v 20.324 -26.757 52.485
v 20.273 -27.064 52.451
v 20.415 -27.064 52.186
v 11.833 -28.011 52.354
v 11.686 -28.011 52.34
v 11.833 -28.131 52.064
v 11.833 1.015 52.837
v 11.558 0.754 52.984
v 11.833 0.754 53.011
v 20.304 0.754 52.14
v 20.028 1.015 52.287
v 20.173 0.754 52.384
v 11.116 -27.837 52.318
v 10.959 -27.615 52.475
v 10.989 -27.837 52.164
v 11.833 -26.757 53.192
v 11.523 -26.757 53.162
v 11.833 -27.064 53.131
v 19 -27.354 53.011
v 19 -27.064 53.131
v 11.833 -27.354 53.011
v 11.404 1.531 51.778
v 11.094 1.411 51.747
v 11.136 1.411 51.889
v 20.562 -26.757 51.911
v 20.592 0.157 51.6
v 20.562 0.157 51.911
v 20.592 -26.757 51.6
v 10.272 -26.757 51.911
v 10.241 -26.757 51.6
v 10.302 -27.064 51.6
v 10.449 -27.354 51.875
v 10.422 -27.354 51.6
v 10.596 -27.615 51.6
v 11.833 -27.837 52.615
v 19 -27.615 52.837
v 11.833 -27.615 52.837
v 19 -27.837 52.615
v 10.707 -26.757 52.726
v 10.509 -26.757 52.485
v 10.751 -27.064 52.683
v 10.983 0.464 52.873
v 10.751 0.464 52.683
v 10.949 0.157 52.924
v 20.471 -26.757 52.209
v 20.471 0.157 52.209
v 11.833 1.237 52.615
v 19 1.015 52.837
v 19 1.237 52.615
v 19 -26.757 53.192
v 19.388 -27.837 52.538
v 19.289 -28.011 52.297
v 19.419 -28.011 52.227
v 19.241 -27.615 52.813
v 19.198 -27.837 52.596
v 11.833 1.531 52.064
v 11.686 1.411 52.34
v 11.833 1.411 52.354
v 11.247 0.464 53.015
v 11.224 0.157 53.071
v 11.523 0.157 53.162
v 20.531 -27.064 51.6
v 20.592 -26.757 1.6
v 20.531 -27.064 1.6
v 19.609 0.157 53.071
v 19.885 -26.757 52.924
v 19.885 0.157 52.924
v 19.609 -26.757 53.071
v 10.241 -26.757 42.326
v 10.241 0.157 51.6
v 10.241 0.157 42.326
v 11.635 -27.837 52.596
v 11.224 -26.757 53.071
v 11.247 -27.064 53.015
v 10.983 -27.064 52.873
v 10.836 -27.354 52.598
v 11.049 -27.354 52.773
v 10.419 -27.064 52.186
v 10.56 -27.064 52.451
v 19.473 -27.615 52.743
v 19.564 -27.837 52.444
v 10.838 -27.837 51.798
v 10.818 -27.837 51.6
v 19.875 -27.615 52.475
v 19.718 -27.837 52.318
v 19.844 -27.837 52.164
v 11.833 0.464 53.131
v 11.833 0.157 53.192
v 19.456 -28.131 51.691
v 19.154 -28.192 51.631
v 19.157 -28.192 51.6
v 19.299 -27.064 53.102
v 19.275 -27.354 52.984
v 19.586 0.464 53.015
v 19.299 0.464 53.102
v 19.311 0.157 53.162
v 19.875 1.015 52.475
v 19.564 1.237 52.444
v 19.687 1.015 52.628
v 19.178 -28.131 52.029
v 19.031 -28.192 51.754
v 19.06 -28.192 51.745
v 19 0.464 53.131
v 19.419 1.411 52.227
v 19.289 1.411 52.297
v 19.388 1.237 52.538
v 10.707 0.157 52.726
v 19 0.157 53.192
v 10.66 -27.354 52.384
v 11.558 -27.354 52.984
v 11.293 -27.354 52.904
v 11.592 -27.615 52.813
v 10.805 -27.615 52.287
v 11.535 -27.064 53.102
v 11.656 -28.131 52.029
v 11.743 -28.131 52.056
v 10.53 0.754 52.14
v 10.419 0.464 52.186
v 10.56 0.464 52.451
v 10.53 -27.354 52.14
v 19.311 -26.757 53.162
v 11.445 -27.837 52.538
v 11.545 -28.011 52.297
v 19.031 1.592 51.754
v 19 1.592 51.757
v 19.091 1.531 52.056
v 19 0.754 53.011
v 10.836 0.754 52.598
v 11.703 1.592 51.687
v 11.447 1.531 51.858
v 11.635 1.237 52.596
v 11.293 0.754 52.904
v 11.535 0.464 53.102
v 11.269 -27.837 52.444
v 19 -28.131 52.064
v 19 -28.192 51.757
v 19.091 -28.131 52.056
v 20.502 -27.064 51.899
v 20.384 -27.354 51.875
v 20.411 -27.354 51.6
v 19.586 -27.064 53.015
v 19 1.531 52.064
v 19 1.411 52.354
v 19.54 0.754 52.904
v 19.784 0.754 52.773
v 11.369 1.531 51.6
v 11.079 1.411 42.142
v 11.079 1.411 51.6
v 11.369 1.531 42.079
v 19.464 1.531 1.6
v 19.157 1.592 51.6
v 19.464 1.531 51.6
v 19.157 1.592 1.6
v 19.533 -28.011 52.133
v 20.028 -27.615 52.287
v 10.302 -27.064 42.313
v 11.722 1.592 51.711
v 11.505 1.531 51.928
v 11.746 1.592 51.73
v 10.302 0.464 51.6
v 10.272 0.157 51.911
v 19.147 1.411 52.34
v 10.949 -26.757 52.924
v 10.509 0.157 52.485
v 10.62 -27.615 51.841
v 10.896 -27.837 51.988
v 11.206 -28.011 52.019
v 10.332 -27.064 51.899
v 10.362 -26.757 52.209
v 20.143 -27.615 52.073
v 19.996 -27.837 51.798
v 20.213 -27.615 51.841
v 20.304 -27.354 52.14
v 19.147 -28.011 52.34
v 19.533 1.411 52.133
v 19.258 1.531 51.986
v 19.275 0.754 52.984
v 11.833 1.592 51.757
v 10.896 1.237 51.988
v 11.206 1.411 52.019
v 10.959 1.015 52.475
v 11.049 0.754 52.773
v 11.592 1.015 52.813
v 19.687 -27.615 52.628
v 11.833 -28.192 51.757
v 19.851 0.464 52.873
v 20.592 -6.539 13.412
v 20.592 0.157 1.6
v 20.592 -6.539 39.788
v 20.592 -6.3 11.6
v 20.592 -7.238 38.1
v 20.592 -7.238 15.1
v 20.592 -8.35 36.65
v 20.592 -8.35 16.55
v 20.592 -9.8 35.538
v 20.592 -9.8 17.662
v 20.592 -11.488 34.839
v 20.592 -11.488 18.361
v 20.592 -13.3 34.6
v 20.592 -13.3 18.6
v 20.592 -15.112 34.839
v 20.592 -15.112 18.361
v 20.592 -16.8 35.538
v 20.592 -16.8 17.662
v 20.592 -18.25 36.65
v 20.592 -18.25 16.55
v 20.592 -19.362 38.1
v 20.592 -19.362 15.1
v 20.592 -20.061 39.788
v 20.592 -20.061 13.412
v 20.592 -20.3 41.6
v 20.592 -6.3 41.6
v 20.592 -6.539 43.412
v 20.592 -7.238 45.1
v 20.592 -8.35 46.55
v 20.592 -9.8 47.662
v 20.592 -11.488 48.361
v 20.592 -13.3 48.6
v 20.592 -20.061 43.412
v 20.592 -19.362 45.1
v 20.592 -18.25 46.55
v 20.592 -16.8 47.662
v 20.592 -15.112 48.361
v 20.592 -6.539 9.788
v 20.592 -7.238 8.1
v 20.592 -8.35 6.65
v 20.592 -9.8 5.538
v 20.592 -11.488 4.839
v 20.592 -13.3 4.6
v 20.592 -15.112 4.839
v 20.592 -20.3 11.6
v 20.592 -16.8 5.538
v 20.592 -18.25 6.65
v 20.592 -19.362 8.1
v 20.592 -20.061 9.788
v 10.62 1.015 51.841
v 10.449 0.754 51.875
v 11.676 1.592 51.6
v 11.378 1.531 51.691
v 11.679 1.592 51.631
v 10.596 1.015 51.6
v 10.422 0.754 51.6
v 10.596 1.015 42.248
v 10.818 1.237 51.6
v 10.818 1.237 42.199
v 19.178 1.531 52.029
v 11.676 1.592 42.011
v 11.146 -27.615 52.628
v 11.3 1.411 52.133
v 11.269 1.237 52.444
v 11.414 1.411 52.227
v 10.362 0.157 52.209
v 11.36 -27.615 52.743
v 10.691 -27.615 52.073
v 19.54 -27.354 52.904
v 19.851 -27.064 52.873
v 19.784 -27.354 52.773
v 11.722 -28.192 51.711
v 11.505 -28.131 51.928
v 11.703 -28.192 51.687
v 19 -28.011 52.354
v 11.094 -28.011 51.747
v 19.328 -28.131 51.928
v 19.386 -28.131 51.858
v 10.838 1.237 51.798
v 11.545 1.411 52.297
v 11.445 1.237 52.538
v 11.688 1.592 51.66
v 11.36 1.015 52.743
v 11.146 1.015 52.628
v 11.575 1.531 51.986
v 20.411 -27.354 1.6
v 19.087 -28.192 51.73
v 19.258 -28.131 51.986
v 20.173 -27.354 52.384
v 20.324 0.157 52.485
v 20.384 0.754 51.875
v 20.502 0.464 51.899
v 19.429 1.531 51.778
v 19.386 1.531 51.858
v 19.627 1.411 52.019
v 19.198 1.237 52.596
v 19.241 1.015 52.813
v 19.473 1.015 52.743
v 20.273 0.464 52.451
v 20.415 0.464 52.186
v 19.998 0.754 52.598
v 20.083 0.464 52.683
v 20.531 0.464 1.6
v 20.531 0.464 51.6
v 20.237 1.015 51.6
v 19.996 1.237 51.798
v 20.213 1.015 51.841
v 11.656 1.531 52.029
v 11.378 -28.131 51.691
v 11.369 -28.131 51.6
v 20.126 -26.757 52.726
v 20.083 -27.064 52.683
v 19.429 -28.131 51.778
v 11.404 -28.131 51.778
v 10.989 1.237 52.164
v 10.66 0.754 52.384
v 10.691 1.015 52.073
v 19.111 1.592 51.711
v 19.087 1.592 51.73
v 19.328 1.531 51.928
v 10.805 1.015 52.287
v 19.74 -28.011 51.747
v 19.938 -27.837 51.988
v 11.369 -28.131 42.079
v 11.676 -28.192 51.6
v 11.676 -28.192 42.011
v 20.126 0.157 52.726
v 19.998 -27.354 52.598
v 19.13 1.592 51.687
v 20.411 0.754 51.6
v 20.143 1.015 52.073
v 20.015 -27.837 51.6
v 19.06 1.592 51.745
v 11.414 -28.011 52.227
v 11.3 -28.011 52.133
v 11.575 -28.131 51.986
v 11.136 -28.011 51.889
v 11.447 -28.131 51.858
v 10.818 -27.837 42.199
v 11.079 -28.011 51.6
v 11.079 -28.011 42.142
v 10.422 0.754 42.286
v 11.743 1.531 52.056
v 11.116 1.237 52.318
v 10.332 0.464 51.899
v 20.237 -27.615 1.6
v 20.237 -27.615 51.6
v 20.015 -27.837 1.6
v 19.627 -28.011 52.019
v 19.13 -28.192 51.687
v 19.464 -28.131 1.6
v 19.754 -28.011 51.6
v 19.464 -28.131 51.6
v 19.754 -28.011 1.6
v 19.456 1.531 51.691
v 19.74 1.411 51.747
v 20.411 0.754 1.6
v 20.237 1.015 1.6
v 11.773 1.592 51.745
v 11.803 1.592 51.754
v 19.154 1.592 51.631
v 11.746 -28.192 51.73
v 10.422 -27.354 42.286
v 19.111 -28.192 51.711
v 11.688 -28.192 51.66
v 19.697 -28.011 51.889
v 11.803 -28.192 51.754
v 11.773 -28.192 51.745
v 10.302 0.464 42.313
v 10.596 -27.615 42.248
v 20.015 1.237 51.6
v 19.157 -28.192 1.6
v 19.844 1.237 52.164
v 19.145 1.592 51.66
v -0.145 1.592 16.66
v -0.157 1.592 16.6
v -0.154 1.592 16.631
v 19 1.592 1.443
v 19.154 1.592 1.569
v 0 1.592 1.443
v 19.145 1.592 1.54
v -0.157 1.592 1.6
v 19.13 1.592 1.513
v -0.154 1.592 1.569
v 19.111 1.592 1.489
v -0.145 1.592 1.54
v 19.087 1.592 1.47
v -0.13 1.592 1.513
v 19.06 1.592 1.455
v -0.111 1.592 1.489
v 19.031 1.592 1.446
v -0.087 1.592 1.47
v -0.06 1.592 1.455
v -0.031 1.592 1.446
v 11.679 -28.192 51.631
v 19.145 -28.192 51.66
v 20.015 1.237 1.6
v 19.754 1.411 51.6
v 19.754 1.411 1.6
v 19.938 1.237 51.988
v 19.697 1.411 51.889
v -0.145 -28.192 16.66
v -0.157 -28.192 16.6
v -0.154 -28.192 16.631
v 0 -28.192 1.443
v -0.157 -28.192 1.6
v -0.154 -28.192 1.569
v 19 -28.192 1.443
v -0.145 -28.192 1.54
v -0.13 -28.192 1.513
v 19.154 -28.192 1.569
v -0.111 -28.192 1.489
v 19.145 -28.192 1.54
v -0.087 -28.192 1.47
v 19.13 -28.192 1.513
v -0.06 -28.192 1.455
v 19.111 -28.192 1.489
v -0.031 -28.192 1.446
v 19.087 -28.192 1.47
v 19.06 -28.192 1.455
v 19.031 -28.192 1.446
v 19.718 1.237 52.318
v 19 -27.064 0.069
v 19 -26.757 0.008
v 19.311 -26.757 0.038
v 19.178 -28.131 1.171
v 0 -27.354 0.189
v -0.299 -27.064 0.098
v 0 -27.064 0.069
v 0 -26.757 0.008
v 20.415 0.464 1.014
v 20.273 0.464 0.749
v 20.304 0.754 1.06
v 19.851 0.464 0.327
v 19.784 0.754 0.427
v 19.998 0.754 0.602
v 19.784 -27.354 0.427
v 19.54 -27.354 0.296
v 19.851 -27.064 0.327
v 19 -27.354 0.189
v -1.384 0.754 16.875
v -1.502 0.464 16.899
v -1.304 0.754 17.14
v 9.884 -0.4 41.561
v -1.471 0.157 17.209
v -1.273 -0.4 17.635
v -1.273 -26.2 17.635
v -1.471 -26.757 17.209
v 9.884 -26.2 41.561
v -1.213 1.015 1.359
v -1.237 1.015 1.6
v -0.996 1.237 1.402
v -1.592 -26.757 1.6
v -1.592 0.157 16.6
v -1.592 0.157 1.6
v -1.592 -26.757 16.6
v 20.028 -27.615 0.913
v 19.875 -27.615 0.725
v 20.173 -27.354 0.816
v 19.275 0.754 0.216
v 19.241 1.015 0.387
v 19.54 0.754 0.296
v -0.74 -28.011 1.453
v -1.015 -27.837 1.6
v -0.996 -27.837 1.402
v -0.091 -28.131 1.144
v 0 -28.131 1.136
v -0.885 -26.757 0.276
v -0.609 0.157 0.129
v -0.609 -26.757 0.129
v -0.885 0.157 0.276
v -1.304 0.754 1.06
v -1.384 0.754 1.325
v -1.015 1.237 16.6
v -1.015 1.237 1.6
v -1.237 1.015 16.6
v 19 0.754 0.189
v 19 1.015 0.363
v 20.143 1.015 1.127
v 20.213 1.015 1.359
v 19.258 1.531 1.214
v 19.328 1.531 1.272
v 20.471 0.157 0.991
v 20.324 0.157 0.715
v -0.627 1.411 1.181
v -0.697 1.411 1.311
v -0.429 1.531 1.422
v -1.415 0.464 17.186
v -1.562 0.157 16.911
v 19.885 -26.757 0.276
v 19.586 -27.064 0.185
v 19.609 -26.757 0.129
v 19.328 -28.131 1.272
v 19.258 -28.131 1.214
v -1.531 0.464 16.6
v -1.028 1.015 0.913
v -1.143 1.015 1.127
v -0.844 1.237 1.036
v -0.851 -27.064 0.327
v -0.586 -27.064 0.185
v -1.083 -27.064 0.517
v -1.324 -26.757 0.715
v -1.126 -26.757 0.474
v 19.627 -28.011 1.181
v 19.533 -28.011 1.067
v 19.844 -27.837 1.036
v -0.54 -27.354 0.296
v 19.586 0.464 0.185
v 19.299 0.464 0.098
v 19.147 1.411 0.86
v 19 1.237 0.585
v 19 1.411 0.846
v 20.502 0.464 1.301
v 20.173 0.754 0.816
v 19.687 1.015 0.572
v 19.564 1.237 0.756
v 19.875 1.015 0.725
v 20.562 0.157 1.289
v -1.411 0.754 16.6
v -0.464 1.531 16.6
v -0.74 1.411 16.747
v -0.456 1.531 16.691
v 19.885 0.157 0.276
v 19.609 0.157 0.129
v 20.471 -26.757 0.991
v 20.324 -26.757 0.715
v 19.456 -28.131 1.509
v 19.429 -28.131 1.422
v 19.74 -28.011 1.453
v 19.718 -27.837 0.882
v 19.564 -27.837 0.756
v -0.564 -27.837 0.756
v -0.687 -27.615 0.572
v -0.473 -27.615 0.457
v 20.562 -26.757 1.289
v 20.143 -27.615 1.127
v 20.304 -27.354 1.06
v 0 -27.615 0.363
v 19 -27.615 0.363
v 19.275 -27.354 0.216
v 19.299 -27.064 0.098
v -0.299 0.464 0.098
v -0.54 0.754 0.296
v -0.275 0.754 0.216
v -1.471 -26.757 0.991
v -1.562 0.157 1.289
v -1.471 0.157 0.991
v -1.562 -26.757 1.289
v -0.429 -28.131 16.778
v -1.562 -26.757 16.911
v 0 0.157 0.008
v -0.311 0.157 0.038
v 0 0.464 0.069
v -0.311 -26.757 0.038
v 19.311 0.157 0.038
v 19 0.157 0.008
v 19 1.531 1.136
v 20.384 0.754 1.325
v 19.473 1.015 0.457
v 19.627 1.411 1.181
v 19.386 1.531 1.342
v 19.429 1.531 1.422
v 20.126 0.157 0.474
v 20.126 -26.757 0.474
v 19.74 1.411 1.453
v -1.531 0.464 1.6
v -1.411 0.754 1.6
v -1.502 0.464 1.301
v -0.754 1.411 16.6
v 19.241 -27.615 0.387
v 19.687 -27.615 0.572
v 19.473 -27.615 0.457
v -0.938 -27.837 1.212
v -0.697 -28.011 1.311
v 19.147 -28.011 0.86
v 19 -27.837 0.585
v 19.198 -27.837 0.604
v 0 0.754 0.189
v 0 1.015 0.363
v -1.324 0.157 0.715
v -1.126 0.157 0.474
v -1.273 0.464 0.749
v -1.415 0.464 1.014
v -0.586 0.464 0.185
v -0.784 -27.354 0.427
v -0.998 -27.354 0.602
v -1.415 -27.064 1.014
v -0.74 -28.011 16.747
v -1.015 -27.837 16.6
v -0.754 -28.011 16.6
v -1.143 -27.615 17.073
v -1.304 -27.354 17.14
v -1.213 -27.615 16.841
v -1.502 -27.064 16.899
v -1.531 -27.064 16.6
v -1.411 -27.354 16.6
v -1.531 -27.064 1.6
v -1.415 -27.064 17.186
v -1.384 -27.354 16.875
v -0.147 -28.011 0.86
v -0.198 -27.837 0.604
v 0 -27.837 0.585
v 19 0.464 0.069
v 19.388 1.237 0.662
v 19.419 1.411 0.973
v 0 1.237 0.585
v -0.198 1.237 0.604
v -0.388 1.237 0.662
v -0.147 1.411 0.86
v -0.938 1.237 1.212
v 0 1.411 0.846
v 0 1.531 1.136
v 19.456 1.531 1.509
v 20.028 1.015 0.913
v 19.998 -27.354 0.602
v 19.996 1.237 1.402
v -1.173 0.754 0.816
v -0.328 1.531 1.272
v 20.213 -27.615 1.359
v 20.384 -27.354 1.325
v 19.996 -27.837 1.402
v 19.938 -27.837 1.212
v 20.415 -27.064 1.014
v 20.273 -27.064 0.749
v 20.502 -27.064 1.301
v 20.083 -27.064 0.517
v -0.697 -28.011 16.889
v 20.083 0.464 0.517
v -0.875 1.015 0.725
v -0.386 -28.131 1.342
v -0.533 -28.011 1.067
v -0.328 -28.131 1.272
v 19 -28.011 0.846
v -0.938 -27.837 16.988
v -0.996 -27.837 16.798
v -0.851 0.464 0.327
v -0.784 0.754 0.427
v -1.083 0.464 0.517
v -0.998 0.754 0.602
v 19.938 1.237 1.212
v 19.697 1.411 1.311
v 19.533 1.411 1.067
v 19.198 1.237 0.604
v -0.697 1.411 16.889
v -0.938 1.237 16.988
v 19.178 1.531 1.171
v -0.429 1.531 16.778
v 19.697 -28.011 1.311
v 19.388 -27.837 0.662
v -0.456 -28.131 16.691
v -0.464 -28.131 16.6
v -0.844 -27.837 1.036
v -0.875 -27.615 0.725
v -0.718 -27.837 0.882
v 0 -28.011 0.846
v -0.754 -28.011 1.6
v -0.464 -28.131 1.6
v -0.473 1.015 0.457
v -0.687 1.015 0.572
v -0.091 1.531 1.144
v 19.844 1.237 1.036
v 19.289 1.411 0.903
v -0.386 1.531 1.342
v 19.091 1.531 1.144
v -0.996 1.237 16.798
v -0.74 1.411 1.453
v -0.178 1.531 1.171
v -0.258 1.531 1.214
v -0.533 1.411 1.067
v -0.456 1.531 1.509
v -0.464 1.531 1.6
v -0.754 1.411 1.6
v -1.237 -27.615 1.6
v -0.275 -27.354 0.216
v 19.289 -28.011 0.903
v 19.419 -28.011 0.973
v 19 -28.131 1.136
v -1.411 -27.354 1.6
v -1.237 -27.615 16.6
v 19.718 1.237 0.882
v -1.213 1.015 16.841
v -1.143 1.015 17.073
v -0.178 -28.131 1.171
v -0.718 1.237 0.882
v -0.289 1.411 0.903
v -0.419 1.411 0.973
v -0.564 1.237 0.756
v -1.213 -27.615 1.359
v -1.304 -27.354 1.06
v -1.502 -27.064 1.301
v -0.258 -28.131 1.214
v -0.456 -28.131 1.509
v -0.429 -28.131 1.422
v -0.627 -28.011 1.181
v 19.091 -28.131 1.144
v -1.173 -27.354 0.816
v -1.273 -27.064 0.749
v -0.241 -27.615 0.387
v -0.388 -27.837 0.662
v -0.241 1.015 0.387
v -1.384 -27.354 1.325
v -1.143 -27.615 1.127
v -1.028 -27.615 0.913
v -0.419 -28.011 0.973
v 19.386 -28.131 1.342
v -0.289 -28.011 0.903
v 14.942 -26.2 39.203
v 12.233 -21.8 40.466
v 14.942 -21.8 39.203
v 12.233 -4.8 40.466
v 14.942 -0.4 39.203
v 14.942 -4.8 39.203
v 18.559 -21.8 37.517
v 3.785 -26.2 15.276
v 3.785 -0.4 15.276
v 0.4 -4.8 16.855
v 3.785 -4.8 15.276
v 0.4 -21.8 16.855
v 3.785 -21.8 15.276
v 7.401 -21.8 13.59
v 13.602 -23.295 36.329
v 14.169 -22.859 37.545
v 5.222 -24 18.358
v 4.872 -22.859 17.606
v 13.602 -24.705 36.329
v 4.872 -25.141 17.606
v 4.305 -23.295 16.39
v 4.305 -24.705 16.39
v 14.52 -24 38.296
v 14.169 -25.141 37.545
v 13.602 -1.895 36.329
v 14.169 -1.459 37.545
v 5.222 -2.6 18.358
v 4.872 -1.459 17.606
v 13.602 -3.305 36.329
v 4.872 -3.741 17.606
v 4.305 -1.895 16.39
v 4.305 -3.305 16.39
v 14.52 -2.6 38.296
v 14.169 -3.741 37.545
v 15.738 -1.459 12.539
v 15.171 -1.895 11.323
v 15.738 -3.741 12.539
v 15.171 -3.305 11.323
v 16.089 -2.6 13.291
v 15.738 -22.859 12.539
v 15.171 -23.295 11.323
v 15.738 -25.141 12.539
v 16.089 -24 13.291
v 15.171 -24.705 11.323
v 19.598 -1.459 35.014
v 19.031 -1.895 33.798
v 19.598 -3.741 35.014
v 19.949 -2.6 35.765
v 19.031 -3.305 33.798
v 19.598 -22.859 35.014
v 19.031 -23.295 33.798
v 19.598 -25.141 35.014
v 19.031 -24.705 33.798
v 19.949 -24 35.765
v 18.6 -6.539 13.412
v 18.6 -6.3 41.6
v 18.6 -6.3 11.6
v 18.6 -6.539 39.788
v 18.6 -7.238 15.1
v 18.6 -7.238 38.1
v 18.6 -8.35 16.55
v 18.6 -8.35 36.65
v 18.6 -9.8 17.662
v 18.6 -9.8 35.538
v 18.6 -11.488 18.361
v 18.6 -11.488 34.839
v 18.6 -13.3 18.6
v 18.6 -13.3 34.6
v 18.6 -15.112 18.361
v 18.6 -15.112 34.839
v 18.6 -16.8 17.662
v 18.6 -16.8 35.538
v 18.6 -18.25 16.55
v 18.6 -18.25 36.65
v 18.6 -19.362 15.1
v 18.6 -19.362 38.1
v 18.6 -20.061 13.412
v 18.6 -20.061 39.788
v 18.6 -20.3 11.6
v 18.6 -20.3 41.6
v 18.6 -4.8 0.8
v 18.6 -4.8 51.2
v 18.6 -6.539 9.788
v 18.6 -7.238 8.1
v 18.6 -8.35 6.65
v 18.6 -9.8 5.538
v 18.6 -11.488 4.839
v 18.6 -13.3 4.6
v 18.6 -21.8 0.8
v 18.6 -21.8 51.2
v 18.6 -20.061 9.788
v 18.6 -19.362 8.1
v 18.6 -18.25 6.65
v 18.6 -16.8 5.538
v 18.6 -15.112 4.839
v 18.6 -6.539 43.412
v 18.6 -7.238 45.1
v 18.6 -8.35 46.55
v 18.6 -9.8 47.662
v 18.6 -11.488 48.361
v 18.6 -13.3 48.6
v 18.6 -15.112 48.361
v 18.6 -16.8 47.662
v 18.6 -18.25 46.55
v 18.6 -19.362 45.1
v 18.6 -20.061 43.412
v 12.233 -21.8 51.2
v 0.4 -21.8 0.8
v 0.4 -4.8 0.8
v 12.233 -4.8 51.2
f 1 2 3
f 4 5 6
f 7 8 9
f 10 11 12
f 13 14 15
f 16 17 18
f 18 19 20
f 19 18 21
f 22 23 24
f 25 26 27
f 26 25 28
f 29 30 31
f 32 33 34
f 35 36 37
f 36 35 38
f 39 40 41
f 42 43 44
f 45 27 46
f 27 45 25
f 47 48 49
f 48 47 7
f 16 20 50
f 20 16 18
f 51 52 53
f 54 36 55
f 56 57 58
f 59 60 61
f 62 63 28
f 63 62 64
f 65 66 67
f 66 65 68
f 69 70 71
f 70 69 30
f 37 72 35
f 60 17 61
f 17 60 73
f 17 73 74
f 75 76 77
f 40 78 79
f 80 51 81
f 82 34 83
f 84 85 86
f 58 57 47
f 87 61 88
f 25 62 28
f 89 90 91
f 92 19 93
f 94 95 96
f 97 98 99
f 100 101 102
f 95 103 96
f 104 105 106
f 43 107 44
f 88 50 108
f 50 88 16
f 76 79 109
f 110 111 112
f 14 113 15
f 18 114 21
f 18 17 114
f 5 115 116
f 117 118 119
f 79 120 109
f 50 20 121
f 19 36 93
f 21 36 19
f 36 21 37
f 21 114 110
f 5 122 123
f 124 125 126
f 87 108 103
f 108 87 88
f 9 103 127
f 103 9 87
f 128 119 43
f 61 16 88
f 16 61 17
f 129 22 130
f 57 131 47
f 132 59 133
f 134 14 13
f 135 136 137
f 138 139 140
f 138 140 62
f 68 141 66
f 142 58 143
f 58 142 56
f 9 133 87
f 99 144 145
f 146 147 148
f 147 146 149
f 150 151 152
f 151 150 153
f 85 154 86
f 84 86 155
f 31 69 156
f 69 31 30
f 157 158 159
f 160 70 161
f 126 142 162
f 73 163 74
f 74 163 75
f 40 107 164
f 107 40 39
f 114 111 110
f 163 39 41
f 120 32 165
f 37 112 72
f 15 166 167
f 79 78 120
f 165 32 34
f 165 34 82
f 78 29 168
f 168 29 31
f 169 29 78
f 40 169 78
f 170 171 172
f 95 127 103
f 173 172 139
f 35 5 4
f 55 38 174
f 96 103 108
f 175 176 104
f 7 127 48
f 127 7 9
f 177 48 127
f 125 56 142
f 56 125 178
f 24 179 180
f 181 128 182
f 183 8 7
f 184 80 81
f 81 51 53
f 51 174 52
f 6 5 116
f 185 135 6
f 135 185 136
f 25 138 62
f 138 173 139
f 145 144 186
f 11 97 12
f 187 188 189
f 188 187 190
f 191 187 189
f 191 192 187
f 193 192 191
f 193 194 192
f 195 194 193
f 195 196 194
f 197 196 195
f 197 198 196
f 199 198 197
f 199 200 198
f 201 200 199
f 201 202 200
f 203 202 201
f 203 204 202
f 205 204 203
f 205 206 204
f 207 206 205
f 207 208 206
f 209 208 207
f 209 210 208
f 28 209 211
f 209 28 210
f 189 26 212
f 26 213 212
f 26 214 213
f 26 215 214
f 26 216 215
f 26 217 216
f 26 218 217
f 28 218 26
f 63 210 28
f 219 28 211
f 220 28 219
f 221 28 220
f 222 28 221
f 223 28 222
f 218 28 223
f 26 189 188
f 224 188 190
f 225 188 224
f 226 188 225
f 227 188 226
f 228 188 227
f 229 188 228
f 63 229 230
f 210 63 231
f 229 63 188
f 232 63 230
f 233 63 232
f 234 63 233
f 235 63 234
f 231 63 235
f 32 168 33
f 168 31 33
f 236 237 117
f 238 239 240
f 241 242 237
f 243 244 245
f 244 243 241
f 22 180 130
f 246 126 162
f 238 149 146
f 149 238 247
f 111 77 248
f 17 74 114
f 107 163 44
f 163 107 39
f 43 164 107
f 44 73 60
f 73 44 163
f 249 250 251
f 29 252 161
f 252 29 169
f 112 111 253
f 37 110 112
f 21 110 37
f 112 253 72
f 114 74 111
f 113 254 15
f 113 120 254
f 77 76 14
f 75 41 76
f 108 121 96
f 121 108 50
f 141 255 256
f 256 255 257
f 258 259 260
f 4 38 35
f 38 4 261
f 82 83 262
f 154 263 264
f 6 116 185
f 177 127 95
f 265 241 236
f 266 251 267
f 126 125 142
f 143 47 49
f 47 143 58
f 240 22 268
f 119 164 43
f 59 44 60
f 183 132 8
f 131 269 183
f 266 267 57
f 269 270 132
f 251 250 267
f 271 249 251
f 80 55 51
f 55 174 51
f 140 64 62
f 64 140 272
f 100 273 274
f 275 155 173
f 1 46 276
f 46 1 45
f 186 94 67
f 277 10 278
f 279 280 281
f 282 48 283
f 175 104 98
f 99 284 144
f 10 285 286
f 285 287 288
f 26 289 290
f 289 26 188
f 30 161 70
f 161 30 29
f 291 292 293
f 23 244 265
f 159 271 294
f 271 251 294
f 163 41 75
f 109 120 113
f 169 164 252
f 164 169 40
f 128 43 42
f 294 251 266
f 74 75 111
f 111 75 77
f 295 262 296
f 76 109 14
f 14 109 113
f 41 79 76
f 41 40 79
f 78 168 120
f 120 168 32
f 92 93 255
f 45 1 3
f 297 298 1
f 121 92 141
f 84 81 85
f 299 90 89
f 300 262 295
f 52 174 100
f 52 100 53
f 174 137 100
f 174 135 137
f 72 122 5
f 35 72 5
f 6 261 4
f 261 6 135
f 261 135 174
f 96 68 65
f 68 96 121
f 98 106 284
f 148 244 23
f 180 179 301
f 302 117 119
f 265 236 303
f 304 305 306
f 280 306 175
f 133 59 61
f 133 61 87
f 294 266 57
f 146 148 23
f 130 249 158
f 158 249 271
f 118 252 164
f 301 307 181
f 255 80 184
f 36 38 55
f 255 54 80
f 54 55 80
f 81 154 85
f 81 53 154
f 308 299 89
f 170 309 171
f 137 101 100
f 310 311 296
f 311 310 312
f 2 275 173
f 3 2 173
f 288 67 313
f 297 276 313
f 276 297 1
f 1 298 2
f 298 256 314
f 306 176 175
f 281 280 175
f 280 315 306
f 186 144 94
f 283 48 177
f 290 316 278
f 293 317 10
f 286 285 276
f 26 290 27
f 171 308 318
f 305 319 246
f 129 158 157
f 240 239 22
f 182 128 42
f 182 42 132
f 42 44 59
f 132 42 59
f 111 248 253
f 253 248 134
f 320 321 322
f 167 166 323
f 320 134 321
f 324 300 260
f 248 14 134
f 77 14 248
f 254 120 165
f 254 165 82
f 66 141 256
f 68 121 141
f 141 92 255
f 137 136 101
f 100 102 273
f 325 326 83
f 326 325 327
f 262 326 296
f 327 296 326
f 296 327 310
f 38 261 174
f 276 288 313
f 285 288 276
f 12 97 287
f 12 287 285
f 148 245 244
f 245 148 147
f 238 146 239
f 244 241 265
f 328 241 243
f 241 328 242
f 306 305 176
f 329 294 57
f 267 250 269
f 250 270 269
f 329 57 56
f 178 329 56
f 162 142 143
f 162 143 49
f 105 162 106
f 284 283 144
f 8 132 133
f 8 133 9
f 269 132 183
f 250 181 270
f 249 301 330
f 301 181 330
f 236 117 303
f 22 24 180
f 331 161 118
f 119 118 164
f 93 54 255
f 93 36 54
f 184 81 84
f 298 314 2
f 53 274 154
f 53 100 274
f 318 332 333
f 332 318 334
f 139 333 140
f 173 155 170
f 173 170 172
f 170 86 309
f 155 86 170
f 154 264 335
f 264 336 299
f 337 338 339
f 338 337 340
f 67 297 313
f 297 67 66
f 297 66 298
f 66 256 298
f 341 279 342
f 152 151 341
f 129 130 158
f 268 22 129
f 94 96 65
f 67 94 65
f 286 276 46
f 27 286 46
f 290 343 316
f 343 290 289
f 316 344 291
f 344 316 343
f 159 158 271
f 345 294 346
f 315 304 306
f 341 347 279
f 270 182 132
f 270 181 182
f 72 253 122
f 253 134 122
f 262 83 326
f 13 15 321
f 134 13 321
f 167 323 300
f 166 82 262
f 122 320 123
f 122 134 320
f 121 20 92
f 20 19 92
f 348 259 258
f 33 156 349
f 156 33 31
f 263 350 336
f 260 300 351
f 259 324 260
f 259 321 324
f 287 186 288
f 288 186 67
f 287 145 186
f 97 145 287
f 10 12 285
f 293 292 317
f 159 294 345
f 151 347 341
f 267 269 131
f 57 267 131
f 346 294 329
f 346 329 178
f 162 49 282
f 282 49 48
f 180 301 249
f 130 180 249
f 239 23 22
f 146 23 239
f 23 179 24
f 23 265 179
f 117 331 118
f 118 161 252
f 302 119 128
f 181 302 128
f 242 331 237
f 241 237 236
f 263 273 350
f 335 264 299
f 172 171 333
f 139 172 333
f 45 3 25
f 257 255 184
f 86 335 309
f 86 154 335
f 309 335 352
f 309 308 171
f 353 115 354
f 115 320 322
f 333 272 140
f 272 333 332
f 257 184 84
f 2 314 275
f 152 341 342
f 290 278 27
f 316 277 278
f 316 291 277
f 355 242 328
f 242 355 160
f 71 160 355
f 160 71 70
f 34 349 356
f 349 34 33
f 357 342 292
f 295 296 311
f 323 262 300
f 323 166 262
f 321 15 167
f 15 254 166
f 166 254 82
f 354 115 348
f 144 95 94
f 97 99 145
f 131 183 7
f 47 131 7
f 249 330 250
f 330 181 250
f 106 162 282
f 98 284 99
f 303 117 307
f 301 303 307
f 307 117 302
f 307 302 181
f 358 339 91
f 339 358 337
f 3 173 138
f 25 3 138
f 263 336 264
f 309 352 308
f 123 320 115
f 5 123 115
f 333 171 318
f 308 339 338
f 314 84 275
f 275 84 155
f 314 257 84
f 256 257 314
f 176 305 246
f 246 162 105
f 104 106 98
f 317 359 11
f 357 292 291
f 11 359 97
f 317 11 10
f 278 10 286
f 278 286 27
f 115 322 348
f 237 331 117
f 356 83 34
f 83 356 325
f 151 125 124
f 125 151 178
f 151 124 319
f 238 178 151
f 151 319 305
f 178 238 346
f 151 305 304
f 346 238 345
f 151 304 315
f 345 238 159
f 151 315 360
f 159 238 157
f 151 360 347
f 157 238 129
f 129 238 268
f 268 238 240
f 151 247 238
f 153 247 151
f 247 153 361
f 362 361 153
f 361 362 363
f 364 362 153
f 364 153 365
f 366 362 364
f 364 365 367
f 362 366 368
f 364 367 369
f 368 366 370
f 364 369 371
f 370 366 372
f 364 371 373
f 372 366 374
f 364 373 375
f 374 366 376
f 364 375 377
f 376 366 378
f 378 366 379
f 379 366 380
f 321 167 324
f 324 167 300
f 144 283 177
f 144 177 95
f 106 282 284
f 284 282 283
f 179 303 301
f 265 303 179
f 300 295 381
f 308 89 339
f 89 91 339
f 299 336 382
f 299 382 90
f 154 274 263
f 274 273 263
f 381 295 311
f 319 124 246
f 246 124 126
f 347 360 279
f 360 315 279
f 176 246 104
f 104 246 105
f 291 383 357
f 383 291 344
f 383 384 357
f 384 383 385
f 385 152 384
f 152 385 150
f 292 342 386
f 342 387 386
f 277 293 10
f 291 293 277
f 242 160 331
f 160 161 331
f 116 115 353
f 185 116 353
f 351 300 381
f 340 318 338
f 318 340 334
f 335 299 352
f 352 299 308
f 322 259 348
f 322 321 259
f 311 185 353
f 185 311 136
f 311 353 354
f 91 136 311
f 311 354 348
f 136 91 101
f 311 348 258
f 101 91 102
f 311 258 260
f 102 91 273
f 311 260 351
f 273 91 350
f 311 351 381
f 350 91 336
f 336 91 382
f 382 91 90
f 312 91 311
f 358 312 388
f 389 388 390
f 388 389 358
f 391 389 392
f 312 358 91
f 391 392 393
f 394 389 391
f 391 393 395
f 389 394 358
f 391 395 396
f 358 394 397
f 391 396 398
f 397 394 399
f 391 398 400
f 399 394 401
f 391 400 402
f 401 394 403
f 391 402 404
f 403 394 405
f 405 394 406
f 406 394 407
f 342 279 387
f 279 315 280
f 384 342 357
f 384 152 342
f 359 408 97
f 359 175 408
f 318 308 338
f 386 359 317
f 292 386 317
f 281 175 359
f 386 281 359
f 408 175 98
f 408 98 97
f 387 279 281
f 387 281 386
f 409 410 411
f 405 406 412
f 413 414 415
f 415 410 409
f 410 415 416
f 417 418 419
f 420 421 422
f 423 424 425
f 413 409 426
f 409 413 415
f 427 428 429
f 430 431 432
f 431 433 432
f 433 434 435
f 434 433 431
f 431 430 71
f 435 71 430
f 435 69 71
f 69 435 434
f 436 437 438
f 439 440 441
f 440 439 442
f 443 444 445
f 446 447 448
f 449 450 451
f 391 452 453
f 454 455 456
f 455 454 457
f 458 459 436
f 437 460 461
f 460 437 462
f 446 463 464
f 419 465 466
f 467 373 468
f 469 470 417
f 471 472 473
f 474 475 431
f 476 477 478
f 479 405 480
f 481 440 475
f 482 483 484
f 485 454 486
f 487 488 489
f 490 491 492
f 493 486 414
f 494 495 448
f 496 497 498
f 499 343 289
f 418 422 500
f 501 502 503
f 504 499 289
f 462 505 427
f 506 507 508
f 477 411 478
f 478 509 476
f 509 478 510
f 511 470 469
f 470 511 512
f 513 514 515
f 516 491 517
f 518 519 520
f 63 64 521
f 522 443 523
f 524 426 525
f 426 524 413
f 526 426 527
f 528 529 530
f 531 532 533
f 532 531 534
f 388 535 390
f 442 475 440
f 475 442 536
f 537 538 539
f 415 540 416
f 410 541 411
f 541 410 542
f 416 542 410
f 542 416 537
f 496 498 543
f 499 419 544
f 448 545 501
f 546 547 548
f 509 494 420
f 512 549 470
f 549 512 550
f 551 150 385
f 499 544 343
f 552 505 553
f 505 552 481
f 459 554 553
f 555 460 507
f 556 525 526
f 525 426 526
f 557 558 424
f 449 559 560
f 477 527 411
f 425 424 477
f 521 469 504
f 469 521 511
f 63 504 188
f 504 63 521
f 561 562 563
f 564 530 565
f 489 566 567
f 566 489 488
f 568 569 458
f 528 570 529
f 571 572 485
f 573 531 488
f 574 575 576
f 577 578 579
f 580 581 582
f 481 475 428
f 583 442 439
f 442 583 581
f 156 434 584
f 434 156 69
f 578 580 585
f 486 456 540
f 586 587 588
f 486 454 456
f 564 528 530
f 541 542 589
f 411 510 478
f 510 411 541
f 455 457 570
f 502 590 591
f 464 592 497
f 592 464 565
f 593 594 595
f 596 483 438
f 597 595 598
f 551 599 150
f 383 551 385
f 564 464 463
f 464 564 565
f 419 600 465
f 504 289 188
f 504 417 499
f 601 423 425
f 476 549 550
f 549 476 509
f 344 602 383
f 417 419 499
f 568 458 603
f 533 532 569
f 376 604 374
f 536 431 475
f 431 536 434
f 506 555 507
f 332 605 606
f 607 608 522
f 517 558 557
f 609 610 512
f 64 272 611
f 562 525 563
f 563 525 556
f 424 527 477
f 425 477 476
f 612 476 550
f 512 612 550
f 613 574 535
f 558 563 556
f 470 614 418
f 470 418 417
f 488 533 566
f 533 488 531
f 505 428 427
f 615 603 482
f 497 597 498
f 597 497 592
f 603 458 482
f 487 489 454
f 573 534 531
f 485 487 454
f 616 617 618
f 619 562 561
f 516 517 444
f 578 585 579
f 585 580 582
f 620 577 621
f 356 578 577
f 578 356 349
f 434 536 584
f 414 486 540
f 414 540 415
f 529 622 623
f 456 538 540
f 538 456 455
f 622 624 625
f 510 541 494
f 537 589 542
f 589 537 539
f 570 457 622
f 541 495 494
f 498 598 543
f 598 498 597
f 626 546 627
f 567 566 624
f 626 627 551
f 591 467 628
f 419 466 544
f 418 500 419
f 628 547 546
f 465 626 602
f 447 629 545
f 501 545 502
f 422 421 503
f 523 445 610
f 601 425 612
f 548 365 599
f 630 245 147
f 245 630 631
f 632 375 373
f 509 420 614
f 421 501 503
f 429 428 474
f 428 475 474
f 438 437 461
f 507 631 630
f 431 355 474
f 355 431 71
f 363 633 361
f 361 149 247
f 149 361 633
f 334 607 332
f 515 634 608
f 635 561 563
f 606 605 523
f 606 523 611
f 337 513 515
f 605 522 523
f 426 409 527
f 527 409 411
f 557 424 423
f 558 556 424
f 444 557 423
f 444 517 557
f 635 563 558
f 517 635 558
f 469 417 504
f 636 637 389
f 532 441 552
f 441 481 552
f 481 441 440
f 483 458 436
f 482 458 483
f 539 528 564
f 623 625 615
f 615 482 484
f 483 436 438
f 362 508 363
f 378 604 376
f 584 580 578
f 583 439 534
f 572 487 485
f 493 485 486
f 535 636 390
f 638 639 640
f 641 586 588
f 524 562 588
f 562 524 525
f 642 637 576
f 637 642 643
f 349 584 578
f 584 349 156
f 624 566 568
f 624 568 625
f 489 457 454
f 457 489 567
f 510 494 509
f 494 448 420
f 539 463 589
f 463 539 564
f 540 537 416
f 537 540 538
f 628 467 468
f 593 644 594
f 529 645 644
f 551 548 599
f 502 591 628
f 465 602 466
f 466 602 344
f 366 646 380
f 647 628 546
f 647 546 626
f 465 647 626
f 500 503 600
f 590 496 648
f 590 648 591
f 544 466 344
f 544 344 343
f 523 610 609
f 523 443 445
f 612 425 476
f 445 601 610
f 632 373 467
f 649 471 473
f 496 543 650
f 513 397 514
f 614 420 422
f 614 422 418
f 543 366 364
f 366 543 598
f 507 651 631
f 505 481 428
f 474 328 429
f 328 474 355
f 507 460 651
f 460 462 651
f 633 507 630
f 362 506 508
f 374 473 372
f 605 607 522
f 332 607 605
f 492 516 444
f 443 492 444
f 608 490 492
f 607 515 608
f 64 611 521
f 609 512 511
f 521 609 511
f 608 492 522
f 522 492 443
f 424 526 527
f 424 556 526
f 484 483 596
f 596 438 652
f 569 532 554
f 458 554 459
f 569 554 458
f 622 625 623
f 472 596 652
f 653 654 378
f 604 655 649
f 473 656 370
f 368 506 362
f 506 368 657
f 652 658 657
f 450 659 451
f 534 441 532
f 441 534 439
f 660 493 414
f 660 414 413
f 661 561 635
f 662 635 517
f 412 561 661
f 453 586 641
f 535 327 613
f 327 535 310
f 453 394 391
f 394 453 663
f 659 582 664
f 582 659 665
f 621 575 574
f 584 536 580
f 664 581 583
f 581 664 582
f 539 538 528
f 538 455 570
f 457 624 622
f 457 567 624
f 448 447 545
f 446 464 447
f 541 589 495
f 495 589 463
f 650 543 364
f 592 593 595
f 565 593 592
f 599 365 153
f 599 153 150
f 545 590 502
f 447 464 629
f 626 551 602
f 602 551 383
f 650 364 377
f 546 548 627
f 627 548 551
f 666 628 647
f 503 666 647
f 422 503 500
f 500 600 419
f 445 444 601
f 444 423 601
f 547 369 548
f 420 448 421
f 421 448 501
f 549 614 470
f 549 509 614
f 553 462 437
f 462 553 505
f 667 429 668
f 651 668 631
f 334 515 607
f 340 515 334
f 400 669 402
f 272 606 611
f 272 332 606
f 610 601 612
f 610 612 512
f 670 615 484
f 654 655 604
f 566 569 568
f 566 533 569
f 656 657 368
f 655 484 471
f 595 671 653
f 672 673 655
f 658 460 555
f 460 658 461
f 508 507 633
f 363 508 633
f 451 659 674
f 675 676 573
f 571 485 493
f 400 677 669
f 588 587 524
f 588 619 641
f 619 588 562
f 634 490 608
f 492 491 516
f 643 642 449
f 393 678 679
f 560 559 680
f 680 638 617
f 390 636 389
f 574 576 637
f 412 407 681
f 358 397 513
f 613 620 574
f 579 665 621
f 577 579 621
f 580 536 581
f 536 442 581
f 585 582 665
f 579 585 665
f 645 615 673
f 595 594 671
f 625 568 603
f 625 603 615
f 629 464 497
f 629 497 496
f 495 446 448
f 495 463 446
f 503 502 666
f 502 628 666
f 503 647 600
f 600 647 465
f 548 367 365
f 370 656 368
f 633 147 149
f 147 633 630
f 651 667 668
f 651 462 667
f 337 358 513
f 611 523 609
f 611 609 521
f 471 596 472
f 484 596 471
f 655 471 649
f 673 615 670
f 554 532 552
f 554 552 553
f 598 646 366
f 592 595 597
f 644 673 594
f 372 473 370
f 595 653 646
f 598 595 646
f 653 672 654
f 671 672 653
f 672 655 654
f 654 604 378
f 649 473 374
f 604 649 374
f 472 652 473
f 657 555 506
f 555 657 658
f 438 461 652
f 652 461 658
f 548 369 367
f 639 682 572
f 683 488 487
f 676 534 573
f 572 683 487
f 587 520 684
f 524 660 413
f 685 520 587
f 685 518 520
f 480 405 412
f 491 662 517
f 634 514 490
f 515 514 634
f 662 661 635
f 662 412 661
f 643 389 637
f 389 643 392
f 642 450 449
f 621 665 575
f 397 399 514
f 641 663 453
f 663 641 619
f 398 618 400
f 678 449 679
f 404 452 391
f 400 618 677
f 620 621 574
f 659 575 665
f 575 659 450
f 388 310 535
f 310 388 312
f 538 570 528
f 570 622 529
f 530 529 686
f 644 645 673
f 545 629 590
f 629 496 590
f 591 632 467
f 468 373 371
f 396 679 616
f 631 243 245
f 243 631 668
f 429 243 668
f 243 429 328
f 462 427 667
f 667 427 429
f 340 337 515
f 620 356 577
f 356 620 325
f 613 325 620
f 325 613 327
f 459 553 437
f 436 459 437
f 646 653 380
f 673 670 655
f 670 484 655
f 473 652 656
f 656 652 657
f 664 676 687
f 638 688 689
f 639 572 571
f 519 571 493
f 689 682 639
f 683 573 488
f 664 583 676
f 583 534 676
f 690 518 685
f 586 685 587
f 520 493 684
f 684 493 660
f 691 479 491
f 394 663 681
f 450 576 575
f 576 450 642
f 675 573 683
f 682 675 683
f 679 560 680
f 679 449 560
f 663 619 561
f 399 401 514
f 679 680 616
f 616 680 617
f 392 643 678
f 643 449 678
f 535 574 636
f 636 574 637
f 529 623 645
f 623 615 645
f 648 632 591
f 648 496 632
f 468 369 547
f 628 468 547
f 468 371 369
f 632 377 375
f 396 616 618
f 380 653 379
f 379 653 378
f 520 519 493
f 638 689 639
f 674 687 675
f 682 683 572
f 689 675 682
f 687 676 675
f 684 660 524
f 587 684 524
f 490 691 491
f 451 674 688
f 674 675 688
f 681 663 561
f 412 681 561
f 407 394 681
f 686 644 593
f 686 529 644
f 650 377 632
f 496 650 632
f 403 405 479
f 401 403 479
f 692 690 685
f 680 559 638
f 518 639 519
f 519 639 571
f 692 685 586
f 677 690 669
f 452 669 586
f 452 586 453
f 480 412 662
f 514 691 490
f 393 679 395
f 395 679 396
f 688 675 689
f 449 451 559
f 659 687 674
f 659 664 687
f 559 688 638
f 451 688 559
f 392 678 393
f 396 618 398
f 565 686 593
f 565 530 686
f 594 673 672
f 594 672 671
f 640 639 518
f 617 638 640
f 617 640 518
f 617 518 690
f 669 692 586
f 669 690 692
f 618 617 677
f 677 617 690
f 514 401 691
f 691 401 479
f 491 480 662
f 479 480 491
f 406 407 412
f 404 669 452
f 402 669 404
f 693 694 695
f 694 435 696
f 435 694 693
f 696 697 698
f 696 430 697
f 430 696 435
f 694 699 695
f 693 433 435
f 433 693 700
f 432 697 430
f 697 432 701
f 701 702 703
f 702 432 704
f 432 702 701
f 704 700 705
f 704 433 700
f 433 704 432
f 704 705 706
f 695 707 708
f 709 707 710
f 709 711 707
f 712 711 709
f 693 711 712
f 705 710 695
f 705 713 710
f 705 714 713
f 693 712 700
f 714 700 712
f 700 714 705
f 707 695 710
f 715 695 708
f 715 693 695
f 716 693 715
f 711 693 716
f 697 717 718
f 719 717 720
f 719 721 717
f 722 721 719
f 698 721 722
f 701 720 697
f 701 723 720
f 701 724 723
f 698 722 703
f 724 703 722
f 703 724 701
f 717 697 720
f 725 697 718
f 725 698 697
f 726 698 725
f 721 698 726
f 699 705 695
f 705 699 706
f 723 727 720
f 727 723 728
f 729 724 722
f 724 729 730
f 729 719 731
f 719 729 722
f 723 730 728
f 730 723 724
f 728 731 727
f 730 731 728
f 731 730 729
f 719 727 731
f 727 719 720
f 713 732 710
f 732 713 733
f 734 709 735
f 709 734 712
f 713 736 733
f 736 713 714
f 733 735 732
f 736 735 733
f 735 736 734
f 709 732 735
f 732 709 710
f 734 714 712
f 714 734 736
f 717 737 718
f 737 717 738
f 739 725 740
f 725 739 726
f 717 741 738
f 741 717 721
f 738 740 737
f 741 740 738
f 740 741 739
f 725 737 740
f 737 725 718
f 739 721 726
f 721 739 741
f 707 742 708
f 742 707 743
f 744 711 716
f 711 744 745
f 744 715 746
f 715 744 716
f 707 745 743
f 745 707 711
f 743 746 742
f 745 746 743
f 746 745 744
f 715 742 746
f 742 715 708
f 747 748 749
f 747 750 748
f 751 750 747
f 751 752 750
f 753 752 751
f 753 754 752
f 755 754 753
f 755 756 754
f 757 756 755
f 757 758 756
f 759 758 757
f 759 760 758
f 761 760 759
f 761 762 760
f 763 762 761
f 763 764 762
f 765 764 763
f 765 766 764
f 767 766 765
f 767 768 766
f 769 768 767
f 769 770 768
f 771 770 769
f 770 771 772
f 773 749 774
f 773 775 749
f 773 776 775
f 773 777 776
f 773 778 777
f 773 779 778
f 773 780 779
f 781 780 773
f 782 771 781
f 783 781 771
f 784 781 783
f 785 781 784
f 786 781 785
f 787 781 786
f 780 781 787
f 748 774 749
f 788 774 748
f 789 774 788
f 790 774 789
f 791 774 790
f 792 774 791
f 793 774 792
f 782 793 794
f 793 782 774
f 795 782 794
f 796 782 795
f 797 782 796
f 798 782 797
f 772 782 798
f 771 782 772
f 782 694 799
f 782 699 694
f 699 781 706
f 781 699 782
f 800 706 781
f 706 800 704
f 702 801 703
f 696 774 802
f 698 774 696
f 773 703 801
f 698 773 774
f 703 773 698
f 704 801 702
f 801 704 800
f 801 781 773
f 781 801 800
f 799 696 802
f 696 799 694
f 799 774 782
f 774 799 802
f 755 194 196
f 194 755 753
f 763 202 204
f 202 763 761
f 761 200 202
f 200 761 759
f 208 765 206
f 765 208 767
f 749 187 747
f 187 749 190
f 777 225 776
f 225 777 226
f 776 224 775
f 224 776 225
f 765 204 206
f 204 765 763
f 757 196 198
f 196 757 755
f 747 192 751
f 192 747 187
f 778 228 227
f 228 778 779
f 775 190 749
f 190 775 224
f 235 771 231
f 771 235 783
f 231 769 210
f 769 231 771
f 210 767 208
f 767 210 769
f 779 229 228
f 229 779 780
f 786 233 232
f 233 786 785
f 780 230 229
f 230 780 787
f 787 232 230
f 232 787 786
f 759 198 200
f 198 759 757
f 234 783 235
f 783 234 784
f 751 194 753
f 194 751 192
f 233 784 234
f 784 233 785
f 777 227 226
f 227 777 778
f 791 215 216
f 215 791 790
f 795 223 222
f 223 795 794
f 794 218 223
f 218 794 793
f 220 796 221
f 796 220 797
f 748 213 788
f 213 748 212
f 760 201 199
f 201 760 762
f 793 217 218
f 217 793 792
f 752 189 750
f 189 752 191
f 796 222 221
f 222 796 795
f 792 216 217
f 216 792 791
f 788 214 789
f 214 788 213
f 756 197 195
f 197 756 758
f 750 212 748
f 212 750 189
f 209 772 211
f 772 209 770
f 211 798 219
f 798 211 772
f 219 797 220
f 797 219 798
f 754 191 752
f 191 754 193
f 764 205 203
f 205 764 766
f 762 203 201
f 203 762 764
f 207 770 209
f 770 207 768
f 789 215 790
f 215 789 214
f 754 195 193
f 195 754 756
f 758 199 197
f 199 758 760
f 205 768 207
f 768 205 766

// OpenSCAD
/*
  rpm_meeter.scad
*/

wall = 0.4;
bottom_thickness = 0.8;
minkowski_radius = 1.6;
oled_width = 25.8;
oled_height = 26.4;
oled_thickness = 4;
oled_screw_corner = 4.4;
oled_corner_cutout_thickness = 4;
oled_screw_hole_length = 6;
oled_screw_dia = 2.4;   // diameter for the hole into which oled screw has to fit

oled_plate_width = oled_width+2*wall;
oled_plate_height = oled_height+2*wall+minkowski_radius/2;

oled_tilt_angle = 65;
oled_base_height = 15; /* distance between zero level and oled lower border */

oled_upper_x = cos(oled_tilt_angle)*oled_plate_height;
oled_upper_y = sin(oled_tilt_angle)*oled_plate_height+oled_base_height;
rpm_meter_depth = 19; // includes wall
rpm_meter_height = 50; // includes wall
rpm_meter_width = oled_width + 2*wall;


p = 
[ 
  [0,0],
  [0,oled_base_height],
  [oled_upper_x,oled_upper_y],
  [oled_upper_x,rpm_meter_height],
  [rpm_meter_depth,rpm_meter_height],
  [rpm_meter_depth,0]
];


module oled_box() {
  union() {
    cube([oled_height, oled_thickness+minkowski_radius, oled_width]); // roughly the dimension of the oled

    //translate([oled_screw_corner,-oled_corner_cutout_thickness+0.01,0])
    //cube([oled_height-oled_screw_corner*2, oled_corner_cutout_thickness, oled_width]); // roughly the dimension of the oled

    translate([0,-oled_corner_cutout_thickness+0.01,oled_screw_corner])
    cube([oled_height, oled_corner_cutout_thickness, oled_width-oled_screw_corner*2]); // roughly the dimension of the oled

    translate([oled_screw_corner/2, 0.01, oled_screw_corner/2])
    rotate([90,0,0])
    cylinder(d=oled_screw_dia, h=oled_screw_hole_length*2);

    translate([oled_screw_corner/2, 0.01, oled_width-oled_screw_corner/2])
    rotate([90,0,0])
    cylinder(d=oled_screw_dia, h=oled_screw_hole_length*2);

    translate([oled_height-oled_screw_corner/2, 0.01, oled_screw_corner/2])
    rotate([90,0,0])
    cylinder(d=oled_screw_dia, h=oled_screw_hole_length);

    translate([oled_height-oled_screw_corner/2, 0.01, oled_width-oled_screw_corner/2])
    rotate([90,0,0])
    cylinder(d=oled_screw_dia, h=oled_screw_hole_length);
  }
}

module rpm_box_lower_cutout() {
  translate([wall, -minkowski_radius+bottom_thickness, wall+oled_screw_corner])
  cube([rpm_meter_depth-2*wall, oled_upper_y-3*wall-minkowski_radius, oled_width-2*oled_screw_corner]);
}

module rpm_box_upper_cutout() {
translate([wall+oled_upper_x, wall, wall+oled_screw_corner])
cube([rpm_meter_depth-oled_upper_x-2*wall, rpm_meter_height-2*wall, oled_width-2*oled_screw_corner ]);
}

translate([0,0,minkowski_radius])
rotate([90,0,0])
difference() {
  
  minkowski() {
    linear_extrude(height=rpm_meter_width, slices=1)
    polygon(p);
    sphere(r=minkowski_radius, $fn=32);
  }
  
  //linear_extrude(height=rpm_meter_width, slices=1)
  //polygon(p);

  // create a space for the oled
  translate([0,oled_base_height,0])
  rotate([0,0,oled_tilt_angle])
  translate([wall, -oled_thickness+0.01, wall])
  oled_box();
  
  rpm_box_lower_cutout();
  rpm_box_upper_cutout();
  
  translate([rpm_meter_depth,10,rpm_meter_width/2])
  rotate([0,90,0])
  cylinder(r=7, h=(minkowski_radius+wall)*2, center=true, $fn=24);
  
  translate([rpm_meter_depth,rpm_meter_height-10,rpm_meter_width/2])
  rotate([0,90,0])
  cylinder(r=7, h=(minkowski_radius+wall)*2, center=true, $fn=24);
  
}
